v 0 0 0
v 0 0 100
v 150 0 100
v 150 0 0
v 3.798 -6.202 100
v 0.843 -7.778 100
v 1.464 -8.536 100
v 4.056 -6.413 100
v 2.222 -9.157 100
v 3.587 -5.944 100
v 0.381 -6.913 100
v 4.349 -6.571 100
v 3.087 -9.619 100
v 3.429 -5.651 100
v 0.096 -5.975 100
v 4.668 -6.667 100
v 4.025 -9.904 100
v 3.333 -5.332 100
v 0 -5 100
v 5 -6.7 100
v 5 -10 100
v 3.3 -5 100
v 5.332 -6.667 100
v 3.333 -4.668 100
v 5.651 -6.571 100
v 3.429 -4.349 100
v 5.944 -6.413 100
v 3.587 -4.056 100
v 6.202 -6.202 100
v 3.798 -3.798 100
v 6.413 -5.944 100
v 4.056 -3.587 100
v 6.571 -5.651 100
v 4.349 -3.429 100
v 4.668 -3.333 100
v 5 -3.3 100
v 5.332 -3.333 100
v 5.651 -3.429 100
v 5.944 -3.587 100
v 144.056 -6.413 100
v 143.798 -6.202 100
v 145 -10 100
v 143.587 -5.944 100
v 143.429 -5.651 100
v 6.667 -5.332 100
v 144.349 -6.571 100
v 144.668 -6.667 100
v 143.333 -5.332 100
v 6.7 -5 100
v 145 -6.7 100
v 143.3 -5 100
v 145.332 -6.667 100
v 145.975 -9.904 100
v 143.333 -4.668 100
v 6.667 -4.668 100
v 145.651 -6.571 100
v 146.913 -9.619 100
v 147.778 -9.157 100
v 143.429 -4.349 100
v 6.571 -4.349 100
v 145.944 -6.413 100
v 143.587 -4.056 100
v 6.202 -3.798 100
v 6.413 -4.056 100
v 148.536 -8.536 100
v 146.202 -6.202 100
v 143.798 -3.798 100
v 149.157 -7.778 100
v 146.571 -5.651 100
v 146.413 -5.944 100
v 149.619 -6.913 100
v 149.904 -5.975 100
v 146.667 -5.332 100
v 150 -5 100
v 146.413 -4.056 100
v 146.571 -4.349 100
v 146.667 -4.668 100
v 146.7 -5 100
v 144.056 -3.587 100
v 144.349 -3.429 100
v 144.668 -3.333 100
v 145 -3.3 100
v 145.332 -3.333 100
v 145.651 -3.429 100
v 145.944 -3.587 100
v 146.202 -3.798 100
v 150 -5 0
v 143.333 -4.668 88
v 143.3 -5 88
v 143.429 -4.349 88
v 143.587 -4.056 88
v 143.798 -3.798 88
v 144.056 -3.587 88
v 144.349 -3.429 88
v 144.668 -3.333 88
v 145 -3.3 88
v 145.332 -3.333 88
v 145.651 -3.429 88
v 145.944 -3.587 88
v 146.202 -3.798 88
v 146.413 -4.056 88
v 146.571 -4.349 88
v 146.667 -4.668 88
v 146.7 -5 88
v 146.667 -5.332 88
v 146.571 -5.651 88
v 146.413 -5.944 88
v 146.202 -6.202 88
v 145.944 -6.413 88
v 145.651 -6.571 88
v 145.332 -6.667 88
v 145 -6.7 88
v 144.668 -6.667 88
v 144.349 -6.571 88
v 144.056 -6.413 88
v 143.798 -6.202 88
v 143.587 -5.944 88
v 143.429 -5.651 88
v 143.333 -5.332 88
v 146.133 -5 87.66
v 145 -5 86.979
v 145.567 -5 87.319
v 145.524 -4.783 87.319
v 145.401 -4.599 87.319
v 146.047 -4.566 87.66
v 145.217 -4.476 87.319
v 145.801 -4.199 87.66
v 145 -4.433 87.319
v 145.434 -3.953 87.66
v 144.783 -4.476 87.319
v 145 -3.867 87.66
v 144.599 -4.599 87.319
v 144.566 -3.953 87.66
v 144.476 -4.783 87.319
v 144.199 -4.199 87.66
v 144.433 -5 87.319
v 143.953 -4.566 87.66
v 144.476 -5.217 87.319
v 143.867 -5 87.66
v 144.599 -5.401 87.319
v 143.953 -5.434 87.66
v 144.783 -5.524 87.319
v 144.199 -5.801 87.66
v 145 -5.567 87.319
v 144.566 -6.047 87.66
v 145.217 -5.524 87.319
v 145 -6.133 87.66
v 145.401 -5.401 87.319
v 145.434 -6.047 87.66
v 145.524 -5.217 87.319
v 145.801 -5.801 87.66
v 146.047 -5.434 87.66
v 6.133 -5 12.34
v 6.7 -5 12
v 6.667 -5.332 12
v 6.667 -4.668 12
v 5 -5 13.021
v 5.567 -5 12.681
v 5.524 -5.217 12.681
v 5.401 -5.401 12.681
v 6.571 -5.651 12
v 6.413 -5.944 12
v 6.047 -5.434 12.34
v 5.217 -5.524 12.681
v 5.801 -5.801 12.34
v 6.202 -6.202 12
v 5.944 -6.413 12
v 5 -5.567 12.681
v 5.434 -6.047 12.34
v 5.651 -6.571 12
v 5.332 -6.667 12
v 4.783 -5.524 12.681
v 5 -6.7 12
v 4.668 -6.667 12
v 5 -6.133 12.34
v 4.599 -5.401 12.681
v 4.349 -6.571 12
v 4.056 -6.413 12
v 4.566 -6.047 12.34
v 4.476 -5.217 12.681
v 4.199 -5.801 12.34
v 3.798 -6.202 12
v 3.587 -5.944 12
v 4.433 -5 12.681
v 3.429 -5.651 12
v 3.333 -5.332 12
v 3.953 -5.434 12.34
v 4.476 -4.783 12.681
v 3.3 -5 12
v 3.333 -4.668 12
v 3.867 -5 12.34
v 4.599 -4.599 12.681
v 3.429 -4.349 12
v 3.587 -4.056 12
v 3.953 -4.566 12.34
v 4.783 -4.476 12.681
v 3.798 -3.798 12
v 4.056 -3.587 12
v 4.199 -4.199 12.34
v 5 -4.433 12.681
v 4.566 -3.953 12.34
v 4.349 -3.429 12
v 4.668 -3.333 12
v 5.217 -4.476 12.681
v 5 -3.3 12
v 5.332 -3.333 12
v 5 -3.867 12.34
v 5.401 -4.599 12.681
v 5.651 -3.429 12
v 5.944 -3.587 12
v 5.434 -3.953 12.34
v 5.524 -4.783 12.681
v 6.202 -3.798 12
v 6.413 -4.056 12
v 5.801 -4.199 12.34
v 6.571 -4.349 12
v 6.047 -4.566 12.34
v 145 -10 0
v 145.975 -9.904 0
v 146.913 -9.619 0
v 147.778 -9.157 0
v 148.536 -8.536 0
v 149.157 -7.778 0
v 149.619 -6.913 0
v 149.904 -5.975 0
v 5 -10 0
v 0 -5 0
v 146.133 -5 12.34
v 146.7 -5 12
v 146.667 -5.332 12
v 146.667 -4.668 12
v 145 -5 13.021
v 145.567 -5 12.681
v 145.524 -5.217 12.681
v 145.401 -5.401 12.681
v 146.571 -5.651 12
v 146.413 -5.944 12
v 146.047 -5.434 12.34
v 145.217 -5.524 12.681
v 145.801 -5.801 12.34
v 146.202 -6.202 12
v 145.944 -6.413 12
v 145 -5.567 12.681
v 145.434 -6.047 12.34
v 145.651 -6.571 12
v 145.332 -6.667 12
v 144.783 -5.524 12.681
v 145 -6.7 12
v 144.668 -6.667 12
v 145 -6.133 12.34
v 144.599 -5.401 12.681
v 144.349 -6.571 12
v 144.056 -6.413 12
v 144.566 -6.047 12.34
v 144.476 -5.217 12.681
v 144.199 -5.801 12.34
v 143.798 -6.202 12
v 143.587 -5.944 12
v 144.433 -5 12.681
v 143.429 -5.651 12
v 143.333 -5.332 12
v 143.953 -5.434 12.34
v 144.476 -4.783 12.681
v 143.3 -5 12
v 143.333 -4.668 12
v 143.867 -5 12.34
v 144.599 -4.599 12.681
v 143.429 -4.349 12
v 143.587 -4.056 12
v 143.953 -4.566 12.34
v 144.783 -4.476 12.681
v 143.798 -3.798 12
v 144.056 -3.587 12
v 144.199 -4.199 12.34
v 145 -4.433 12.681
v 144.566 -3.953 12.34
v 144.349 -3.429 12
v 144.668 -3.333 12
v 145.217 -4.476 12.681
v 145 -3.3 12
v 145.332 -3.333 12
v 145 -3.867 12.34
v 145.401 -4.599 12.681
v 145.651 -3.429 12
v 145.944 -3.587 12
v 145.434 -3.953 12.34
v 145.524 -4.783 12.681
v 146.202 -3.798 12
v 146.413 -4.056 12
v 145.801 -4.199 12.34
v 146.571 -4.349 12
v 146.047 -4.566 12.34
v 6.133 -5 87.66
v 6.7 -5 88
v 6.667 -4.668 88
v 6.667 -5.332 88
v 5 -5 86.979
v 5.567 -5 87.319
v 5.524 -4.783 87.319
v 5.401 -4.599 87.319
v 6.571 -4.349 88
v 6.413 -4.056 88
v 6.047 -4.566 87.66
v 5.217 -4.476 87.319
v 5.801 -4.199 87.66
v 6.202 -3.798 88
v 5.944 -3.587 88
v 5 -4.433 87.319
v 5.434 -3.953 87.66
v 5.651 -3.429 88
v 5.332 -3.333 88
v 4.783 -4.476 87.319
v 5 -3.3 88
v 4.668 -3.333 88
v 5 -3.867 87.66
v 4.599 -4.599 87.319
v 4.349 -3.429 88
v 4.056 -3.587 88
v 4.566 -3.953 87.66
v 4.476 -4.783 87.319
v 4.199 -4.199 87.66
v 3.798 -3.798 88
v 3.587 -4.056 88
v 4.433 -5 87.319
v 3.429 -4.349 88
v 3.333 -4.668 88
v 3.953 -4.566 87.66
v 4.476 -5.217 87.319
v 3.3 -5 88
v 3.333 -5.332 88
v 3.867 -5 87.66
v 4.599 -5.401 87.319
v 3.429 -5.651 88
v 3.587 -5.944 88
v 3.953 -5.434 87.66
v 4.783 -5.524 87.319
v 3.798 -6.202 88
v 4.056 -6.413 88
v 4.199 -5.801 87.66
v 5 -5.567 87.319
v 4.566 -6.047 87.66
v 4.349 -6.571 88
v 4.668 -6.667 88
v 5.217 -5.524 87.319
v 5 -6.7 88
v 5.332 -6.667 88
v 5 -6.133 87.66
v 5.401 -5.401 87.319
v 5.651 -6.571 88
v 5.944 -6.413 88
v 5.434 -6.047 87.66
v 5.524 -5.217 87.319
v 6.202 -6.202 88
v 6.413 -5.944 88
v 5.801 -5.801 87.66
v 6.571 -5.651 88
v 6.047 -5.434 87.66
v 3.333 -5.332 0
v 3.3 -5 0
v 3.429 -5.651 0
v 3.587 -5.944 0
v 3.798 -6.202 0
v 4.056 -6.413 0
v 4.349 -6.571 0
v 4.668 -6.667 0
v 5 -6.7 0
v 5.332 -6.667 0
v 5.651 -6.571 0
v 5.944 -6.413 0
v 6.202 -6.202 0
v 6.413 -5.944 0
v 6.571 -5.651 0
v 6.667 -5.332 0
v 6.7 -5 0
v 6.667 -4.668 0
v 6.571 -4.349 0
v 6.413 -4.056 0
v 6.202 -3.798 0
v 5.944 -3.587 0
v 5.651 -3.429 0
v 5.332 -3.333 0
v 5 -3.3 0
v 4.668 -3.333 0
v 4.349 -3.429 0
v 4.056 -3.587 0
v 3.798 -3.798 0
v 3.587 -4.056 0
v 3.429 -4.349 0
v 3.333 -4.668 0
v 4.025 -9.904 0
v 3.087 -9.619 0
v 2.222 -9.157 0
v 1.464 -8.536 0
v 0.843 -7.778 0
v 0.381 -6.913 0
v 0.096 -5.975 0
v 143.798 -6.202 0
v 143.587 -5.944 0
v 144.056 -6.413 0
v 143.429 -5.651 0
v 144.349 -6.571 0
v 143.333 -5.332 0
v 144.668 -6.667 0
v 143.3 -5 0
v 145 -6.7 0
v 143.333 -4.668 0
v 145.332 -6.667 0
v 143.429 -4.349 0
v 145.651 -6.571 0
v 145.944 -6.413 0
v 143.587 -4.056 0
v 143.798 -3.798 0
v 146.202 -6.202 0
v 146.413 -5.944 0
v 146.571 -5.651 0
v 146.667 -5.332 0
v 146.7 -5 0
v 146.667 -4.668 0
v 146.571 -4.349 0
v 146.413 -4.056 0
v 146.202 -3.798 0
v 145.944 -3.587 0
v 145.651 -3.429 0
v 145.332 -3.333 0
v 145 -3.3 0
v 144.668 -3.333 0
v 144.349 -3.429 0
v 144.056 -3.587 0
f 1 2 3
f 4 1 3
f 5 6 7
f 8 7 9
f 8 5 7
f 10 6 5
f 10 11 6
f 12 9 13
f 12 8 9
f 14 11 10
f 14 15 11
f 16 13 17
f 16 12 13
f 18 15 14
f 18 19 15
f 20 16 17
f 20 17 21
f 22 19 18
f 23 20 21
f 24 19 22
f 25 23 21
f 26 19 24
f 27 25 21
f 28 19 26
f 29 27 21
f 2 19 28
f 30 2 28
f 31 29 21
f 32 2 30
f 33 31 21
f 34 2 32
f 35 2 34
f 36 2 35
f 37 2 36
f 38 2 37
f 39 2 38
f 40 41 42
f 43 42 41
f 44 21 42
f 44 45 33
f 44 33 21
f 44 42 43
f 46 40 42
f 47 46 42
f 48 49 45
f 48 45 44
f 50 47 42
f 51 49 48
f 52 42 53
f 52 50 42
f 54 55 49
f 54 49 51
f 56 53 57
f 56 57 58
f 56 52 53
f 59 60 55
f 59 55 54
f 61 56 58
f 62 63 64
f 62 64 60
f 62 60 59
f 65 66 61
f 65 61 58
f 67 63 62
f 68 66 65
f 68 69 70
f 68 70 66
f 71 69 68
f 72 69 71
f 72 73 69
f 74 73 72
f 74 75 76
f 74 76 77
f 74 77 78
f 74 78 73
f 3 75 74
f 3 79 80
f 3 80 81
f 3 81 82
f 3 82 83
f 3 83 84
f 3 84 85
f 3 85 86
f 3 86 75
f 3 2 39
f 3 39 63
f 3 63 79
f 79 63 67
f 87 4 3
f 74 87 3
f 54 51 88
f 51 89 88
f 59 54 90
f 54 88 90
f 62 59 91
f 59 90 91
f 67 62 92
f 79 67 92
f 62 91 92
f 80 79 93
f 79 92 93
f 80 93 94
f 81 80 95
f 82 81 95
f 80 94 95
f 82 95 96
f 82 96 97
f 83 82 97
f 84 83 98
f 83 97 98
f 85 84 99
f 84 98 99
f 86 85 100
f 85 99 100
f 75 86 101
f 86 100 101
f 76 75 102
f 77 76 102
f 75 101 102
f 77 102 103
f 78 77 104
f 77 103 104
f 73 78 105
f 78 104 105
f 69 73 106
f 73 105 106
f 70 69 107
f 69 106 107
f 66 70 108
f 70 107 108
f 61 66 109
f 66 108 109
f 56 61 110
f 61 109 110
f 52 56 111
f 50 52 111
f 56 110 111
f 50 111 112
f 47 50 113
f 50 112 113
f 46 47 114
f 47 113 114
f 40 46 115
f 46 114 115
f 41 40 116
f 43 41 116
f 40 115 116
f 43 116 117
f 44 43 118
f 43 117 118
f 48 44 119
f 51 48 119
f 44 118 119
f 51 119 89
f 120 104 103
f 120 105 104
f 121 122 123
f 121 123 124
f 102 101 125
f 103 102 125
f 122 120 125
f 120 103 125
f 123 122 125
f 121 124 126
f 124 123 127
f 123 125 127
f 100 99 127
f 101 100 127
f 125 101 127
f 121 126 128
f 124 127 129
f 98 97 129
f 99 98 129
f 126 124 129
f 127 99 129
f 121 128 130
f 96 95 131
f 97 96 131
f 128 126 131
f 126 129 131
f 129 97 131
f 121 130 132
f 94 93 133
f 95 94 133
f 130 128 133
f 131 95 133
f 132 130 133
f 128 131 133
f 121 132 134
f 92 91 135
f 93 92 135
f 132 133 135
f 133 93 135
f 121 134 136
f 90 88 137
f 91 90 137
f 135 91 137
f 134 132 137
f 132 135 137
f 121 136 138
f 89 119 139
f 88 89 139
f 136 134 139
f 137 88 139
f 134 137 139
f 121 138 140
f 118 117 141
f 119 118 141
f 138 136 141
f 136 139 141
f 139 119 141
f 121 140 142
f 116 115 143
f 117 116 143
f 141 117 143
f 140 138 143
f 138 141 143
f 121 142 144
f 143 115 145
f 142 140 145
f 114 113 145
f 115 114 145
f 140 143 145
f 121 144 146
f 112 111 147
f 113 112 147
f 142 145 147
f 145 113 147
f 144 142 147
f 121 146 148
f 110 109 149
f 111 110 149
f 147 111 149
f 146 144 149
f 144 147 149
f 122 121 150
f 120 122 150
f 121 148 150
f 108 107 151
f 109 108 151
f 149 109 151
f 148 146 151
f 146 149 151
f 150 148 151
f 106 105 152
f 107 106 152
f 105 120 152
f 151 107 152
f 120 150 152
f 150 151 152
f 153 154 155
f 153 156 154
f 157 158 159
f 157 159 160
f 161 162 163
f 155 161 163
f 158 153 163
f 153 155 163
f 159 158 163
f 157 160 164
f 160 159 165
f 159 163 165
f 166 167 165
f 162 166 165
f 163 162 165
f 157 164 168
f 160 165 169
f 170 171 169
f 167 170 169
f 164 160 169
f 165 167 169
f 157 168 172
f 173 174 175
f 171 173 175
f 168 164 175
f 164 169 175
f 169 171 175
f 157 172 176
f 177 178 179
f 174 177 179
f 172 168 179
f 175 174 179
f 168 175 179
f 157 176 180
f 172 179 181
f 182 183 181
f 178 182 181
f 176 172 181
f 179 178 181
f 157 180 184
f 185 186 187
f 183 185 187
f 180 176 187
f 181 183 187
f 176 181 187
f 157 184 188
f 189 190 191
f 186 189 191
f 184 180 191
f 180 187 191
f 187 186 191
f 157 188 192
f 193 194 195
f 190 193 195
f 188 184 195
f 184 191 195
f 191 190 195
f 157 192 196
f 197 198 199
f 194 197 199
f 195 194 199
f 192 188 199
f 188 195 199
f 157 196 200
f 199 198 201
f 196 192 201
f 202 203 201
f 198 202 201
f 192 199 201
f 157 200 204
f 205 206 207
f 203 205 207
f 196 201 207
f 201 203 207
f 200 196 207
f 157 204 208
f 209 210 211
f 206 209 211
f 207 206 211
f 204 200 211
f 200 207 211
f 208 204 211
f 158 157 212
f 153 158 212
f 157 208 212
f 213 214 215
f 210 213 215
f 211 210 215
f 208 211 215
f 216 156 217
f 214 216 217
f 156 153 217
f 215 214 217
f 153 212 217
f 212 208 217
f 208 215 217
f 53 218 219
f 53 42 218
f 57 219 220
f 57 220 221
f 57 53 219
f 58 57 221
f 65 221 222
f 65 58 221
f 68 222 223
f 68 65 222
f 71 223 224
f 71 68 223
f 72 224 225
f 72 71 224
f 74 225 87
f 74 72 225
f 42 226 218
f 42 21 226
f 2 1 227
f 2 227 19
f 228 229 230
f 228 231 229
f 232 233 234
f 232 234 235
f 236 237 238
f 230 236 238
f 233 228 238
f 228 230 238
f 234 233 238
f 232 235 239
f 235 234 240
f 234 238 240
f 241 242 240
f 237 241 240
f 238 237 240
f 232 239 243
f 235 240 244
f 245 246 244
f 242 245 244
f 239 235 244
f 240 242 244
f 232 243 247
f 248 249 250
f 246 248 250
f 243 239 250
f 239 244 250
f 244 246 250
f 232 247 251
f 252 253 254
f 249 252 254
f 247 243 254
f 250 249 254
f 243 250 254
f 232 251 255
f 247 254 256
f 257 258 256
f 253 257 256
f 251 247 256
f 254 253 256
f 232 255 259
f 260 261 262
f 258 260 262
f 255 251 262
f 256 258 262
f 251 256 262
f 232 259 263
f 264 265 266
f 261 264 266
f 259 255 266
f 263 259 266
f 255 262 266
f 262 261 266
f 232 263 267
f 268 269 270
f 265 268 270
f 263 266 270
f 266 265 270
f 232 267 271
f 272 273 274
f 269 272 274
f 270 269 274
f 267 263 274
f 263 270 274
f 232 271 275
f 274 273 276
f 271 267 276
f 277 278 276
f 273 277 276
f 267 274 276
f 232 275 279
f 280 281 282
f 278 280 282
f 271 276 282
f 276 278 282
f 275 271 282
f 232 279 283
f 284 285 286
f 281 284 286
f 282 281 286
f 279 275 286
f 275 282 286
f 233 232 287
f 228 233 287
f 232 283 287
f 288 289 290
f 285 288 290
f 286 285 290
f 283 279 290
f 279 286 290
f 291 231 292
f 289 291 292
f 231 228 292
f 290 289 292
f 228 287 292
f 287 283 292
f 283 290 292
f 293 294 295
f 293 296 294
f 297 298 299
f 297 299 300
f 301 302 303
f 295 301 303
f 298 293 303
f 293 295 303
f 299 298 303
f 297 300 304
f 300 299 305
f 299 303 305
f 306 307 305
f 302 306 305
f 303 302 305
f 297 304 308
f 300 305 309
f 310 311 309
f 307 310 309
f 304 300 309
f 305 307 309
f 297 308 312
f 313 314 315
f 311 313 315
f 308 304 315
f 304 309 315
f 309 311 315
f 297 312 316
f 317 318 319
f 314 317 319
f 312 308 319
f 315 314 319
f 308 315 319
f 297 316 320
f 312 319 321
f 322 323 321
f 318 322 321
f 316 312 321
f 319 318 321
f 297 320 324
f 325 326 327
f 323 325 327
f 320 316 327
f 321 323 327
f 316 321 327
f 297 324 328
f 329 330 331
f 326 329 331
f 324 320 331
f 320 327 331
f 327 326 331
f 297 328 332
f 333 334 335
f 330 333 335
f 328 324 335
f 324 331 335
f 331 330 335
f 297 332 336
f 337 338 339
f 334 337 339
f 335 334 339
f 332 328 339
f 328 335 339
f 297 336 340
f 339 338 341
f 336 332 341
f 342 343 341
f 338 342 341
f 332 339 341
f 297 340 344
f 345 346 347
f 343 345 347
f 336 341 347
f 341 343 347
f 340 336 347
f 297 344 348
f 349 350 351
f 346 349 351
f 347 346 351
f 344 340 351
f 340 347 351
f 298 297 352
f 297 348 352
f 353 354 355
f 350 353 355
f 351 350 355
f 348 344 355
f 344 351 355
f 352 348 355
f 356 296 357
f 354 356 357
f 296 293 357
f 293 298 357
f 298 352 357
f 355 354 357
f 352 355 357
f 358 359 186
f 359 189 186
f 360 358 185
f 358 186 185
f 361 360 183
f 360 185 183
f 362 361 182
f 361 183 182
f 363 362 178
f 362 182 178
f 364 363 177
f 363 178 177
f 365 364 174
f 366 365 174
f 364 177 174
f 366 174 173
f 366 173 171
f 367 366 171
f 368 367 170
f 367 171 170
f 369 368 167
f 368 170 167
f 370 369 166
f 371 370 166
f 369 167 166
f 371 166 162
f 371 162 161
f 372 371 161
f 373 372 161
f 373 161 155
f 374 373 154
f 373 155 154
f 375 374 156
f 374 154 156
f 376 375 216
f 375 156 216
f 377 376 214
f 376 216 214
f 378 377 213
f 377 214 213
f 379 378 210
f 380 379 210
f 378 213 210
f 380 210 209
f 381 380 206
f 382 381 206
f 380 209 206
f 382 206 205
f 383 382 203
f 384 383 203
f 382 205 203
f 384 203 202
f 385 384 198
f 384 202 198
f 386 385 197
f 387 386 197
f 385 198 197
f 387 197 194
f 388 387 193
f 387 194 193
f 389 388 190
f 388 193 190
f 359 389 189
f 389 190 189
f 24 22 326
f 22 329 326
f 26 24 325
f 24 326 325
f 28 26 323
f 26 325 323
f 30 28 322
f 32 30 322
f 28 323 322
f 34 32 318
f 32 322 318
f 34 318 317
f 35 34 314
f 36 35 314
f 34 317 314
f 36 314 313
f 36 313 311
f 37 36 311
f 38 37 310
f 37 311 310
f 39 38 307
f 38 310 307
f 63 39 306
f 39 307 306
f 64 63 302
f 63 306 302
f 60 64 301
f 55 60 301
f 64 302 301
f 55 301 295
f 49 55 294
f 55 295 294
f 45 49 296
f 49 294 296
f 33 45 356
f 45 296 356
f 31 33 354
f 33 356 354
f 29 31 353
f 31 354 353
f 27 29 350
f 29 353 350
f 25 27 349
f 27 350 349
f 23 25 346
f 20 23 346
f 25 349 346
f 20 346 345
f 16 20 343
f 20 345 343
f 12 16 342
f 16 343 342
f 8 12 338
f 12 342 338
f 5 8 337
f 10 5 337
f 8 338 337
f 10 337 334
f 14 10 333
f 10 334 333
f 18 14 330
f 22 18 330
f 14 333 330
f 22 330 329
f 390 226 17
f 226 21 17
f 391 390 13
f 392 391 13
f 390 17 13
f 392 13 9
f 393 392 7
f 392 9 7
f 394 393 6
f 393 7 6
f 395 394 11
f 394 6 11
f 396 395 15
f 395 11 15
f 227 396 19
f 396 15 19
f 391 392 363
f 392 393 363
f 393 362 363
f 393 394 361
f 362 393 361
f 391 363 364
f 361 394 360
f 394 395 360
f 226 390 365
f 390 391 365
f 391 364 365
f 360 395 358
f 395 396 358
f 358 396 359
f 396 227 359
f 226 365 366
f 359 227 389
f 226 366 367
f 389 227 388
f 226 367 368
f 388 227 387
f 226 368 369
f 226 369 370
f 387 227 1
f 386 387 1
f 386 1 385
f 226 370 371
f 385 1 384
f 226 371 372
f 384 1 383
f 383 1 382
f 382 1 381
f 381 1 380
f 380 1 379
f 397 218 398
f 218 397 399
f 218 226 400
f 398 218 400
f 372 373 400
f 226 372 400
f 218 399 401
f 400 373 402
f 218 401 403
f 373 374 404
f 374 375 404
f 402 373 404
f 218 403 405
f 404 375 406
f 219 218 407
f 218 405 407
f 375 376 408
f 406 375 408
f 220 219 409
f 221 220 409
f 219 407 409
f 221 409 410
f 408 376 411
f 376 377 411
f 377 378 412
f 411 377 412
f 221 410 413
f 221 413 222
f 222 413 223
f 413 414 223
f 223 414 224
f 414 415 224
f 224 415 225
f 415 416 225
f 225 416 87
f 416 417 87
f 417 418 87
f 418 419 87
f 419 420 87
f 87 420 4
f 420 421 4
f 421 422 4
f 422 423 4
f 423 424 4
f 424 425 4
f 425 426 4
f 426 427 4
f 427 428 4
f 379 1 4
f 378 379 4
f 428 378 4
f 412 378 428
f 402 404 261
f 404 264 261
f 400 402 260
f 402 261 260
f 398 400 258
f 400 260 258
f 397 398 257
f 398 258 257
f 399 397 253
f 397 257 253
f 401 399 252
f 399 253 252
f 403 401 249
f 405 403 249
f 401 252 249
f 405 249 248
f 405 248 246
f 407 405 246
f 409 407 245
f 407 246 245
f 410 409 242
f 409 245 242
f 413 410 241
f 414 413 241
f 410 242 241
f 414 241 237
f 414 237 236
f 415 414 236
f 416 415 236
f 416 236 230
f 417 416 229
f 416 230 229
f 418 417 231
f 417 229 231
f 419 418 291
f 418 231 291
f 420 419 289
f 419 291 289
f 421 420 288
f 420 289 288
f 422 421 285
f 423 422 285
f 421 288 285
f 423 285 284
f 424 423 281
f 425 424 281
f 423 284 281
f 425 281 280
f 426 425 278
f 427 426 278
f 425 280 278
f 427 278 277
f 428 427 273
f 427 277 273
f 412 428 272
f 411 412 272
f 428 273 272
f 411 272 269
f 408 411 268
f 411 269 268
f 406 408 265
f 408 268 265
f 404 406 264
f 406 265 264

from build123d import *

# Parameters (mm, degrees)
F0_W     = 150
F0_H     = 100
F1_DEPTH = 10
F3_D     = 3.4
F3_DEPTH = 12
F3_TIP   = 1.0214630523
F4_D     = 3.4
F4_DEPTH = 12
F4_TIP   = 1.0214630523
F6_D     = 3.4
F6_DEPTH = 12
F6_TIP   = 1.0214630523
F7_D     = 3.4
F7_DEPTH = 12
F7_TIP   = 1.0214630523
F8_R     = 5
F9_R     = 5


with BuildPart() as f1:
    # F0 (on Front) → F1 (new body)
    with BuildSketch(Plane.XZ):
        with Locations((75, 50)):
            Rectangle(F0_W, F0_H)
    extrude(amount=F1_DEPTH)

    # F3
    with Locations(Plane.XY.offset(100)):
        with Locations((145, -5)):
            Hole(F3_D / 2, depth=F3_DEPTH)
            with Locations((0, 0, -(F3_DEPTH + F3_TIP / 2))):  # 118° drill point
                Cone(0, F3_D / 2, F3_TIP, mode=Mode.SUBTRACT)

    # F4
    with Locations(Plane.XY.offset(100)):
        with Locations((5, -5)):
            Hole(F4_D / 2, depth=F4_DEPTH)
            with Locations((0, 0, -(F4_DEPTH + F4_TIP / 2))):  # 118° drill point
                Cone(0, F4_D / 2, F4_TIP, mode=Mode.SUBTRACT)

    # F6
    with Locations(Plane(origin=(0, 0, 0), x_dir=(1, 0, 0), z_dir=(0, 0, -1))):
        with Locations((145, 5)):
            Hole(F6_D / 2, depth=F6_DEPTH)
            with Locations((0, 0, -(F6_DEPTH + F6_TIP / 2))):  # 118° drill point
                Cone(0, F6_D / 2, F6_TIP, mode=Mode.SUBTRACT)

    # F7
    with Locations(Plane(origin=(0, 0, 0), x_dir=(1, 0, 0), z_dir=(0, 0, -1))):
        with Locations((5, 5)):
            Hole(F7_D / 2, depth=F7_DEPTH)
            with Locations((0, 0, -(F7_DEPTH + F7_TIP / 2))):  # 118° drill point
                Cone(0, F7_D / 2, F7_TIP, mode=Mode.SUBTRACT)

    # F8
    f8_edges = [f1.edges().sort_by_distance(p)[0] for p in [
        (150, -10, 50),
    ]]
    fillet(f8_edges, radius=F8_R)

    # F9
    f9_edges = [f1.edges().sort_by_distance(p)[0] for p in [
        (0, -10, 50),
    ]]
    fillet(f9_edges, radius=F9_R)


solid = f1.part
